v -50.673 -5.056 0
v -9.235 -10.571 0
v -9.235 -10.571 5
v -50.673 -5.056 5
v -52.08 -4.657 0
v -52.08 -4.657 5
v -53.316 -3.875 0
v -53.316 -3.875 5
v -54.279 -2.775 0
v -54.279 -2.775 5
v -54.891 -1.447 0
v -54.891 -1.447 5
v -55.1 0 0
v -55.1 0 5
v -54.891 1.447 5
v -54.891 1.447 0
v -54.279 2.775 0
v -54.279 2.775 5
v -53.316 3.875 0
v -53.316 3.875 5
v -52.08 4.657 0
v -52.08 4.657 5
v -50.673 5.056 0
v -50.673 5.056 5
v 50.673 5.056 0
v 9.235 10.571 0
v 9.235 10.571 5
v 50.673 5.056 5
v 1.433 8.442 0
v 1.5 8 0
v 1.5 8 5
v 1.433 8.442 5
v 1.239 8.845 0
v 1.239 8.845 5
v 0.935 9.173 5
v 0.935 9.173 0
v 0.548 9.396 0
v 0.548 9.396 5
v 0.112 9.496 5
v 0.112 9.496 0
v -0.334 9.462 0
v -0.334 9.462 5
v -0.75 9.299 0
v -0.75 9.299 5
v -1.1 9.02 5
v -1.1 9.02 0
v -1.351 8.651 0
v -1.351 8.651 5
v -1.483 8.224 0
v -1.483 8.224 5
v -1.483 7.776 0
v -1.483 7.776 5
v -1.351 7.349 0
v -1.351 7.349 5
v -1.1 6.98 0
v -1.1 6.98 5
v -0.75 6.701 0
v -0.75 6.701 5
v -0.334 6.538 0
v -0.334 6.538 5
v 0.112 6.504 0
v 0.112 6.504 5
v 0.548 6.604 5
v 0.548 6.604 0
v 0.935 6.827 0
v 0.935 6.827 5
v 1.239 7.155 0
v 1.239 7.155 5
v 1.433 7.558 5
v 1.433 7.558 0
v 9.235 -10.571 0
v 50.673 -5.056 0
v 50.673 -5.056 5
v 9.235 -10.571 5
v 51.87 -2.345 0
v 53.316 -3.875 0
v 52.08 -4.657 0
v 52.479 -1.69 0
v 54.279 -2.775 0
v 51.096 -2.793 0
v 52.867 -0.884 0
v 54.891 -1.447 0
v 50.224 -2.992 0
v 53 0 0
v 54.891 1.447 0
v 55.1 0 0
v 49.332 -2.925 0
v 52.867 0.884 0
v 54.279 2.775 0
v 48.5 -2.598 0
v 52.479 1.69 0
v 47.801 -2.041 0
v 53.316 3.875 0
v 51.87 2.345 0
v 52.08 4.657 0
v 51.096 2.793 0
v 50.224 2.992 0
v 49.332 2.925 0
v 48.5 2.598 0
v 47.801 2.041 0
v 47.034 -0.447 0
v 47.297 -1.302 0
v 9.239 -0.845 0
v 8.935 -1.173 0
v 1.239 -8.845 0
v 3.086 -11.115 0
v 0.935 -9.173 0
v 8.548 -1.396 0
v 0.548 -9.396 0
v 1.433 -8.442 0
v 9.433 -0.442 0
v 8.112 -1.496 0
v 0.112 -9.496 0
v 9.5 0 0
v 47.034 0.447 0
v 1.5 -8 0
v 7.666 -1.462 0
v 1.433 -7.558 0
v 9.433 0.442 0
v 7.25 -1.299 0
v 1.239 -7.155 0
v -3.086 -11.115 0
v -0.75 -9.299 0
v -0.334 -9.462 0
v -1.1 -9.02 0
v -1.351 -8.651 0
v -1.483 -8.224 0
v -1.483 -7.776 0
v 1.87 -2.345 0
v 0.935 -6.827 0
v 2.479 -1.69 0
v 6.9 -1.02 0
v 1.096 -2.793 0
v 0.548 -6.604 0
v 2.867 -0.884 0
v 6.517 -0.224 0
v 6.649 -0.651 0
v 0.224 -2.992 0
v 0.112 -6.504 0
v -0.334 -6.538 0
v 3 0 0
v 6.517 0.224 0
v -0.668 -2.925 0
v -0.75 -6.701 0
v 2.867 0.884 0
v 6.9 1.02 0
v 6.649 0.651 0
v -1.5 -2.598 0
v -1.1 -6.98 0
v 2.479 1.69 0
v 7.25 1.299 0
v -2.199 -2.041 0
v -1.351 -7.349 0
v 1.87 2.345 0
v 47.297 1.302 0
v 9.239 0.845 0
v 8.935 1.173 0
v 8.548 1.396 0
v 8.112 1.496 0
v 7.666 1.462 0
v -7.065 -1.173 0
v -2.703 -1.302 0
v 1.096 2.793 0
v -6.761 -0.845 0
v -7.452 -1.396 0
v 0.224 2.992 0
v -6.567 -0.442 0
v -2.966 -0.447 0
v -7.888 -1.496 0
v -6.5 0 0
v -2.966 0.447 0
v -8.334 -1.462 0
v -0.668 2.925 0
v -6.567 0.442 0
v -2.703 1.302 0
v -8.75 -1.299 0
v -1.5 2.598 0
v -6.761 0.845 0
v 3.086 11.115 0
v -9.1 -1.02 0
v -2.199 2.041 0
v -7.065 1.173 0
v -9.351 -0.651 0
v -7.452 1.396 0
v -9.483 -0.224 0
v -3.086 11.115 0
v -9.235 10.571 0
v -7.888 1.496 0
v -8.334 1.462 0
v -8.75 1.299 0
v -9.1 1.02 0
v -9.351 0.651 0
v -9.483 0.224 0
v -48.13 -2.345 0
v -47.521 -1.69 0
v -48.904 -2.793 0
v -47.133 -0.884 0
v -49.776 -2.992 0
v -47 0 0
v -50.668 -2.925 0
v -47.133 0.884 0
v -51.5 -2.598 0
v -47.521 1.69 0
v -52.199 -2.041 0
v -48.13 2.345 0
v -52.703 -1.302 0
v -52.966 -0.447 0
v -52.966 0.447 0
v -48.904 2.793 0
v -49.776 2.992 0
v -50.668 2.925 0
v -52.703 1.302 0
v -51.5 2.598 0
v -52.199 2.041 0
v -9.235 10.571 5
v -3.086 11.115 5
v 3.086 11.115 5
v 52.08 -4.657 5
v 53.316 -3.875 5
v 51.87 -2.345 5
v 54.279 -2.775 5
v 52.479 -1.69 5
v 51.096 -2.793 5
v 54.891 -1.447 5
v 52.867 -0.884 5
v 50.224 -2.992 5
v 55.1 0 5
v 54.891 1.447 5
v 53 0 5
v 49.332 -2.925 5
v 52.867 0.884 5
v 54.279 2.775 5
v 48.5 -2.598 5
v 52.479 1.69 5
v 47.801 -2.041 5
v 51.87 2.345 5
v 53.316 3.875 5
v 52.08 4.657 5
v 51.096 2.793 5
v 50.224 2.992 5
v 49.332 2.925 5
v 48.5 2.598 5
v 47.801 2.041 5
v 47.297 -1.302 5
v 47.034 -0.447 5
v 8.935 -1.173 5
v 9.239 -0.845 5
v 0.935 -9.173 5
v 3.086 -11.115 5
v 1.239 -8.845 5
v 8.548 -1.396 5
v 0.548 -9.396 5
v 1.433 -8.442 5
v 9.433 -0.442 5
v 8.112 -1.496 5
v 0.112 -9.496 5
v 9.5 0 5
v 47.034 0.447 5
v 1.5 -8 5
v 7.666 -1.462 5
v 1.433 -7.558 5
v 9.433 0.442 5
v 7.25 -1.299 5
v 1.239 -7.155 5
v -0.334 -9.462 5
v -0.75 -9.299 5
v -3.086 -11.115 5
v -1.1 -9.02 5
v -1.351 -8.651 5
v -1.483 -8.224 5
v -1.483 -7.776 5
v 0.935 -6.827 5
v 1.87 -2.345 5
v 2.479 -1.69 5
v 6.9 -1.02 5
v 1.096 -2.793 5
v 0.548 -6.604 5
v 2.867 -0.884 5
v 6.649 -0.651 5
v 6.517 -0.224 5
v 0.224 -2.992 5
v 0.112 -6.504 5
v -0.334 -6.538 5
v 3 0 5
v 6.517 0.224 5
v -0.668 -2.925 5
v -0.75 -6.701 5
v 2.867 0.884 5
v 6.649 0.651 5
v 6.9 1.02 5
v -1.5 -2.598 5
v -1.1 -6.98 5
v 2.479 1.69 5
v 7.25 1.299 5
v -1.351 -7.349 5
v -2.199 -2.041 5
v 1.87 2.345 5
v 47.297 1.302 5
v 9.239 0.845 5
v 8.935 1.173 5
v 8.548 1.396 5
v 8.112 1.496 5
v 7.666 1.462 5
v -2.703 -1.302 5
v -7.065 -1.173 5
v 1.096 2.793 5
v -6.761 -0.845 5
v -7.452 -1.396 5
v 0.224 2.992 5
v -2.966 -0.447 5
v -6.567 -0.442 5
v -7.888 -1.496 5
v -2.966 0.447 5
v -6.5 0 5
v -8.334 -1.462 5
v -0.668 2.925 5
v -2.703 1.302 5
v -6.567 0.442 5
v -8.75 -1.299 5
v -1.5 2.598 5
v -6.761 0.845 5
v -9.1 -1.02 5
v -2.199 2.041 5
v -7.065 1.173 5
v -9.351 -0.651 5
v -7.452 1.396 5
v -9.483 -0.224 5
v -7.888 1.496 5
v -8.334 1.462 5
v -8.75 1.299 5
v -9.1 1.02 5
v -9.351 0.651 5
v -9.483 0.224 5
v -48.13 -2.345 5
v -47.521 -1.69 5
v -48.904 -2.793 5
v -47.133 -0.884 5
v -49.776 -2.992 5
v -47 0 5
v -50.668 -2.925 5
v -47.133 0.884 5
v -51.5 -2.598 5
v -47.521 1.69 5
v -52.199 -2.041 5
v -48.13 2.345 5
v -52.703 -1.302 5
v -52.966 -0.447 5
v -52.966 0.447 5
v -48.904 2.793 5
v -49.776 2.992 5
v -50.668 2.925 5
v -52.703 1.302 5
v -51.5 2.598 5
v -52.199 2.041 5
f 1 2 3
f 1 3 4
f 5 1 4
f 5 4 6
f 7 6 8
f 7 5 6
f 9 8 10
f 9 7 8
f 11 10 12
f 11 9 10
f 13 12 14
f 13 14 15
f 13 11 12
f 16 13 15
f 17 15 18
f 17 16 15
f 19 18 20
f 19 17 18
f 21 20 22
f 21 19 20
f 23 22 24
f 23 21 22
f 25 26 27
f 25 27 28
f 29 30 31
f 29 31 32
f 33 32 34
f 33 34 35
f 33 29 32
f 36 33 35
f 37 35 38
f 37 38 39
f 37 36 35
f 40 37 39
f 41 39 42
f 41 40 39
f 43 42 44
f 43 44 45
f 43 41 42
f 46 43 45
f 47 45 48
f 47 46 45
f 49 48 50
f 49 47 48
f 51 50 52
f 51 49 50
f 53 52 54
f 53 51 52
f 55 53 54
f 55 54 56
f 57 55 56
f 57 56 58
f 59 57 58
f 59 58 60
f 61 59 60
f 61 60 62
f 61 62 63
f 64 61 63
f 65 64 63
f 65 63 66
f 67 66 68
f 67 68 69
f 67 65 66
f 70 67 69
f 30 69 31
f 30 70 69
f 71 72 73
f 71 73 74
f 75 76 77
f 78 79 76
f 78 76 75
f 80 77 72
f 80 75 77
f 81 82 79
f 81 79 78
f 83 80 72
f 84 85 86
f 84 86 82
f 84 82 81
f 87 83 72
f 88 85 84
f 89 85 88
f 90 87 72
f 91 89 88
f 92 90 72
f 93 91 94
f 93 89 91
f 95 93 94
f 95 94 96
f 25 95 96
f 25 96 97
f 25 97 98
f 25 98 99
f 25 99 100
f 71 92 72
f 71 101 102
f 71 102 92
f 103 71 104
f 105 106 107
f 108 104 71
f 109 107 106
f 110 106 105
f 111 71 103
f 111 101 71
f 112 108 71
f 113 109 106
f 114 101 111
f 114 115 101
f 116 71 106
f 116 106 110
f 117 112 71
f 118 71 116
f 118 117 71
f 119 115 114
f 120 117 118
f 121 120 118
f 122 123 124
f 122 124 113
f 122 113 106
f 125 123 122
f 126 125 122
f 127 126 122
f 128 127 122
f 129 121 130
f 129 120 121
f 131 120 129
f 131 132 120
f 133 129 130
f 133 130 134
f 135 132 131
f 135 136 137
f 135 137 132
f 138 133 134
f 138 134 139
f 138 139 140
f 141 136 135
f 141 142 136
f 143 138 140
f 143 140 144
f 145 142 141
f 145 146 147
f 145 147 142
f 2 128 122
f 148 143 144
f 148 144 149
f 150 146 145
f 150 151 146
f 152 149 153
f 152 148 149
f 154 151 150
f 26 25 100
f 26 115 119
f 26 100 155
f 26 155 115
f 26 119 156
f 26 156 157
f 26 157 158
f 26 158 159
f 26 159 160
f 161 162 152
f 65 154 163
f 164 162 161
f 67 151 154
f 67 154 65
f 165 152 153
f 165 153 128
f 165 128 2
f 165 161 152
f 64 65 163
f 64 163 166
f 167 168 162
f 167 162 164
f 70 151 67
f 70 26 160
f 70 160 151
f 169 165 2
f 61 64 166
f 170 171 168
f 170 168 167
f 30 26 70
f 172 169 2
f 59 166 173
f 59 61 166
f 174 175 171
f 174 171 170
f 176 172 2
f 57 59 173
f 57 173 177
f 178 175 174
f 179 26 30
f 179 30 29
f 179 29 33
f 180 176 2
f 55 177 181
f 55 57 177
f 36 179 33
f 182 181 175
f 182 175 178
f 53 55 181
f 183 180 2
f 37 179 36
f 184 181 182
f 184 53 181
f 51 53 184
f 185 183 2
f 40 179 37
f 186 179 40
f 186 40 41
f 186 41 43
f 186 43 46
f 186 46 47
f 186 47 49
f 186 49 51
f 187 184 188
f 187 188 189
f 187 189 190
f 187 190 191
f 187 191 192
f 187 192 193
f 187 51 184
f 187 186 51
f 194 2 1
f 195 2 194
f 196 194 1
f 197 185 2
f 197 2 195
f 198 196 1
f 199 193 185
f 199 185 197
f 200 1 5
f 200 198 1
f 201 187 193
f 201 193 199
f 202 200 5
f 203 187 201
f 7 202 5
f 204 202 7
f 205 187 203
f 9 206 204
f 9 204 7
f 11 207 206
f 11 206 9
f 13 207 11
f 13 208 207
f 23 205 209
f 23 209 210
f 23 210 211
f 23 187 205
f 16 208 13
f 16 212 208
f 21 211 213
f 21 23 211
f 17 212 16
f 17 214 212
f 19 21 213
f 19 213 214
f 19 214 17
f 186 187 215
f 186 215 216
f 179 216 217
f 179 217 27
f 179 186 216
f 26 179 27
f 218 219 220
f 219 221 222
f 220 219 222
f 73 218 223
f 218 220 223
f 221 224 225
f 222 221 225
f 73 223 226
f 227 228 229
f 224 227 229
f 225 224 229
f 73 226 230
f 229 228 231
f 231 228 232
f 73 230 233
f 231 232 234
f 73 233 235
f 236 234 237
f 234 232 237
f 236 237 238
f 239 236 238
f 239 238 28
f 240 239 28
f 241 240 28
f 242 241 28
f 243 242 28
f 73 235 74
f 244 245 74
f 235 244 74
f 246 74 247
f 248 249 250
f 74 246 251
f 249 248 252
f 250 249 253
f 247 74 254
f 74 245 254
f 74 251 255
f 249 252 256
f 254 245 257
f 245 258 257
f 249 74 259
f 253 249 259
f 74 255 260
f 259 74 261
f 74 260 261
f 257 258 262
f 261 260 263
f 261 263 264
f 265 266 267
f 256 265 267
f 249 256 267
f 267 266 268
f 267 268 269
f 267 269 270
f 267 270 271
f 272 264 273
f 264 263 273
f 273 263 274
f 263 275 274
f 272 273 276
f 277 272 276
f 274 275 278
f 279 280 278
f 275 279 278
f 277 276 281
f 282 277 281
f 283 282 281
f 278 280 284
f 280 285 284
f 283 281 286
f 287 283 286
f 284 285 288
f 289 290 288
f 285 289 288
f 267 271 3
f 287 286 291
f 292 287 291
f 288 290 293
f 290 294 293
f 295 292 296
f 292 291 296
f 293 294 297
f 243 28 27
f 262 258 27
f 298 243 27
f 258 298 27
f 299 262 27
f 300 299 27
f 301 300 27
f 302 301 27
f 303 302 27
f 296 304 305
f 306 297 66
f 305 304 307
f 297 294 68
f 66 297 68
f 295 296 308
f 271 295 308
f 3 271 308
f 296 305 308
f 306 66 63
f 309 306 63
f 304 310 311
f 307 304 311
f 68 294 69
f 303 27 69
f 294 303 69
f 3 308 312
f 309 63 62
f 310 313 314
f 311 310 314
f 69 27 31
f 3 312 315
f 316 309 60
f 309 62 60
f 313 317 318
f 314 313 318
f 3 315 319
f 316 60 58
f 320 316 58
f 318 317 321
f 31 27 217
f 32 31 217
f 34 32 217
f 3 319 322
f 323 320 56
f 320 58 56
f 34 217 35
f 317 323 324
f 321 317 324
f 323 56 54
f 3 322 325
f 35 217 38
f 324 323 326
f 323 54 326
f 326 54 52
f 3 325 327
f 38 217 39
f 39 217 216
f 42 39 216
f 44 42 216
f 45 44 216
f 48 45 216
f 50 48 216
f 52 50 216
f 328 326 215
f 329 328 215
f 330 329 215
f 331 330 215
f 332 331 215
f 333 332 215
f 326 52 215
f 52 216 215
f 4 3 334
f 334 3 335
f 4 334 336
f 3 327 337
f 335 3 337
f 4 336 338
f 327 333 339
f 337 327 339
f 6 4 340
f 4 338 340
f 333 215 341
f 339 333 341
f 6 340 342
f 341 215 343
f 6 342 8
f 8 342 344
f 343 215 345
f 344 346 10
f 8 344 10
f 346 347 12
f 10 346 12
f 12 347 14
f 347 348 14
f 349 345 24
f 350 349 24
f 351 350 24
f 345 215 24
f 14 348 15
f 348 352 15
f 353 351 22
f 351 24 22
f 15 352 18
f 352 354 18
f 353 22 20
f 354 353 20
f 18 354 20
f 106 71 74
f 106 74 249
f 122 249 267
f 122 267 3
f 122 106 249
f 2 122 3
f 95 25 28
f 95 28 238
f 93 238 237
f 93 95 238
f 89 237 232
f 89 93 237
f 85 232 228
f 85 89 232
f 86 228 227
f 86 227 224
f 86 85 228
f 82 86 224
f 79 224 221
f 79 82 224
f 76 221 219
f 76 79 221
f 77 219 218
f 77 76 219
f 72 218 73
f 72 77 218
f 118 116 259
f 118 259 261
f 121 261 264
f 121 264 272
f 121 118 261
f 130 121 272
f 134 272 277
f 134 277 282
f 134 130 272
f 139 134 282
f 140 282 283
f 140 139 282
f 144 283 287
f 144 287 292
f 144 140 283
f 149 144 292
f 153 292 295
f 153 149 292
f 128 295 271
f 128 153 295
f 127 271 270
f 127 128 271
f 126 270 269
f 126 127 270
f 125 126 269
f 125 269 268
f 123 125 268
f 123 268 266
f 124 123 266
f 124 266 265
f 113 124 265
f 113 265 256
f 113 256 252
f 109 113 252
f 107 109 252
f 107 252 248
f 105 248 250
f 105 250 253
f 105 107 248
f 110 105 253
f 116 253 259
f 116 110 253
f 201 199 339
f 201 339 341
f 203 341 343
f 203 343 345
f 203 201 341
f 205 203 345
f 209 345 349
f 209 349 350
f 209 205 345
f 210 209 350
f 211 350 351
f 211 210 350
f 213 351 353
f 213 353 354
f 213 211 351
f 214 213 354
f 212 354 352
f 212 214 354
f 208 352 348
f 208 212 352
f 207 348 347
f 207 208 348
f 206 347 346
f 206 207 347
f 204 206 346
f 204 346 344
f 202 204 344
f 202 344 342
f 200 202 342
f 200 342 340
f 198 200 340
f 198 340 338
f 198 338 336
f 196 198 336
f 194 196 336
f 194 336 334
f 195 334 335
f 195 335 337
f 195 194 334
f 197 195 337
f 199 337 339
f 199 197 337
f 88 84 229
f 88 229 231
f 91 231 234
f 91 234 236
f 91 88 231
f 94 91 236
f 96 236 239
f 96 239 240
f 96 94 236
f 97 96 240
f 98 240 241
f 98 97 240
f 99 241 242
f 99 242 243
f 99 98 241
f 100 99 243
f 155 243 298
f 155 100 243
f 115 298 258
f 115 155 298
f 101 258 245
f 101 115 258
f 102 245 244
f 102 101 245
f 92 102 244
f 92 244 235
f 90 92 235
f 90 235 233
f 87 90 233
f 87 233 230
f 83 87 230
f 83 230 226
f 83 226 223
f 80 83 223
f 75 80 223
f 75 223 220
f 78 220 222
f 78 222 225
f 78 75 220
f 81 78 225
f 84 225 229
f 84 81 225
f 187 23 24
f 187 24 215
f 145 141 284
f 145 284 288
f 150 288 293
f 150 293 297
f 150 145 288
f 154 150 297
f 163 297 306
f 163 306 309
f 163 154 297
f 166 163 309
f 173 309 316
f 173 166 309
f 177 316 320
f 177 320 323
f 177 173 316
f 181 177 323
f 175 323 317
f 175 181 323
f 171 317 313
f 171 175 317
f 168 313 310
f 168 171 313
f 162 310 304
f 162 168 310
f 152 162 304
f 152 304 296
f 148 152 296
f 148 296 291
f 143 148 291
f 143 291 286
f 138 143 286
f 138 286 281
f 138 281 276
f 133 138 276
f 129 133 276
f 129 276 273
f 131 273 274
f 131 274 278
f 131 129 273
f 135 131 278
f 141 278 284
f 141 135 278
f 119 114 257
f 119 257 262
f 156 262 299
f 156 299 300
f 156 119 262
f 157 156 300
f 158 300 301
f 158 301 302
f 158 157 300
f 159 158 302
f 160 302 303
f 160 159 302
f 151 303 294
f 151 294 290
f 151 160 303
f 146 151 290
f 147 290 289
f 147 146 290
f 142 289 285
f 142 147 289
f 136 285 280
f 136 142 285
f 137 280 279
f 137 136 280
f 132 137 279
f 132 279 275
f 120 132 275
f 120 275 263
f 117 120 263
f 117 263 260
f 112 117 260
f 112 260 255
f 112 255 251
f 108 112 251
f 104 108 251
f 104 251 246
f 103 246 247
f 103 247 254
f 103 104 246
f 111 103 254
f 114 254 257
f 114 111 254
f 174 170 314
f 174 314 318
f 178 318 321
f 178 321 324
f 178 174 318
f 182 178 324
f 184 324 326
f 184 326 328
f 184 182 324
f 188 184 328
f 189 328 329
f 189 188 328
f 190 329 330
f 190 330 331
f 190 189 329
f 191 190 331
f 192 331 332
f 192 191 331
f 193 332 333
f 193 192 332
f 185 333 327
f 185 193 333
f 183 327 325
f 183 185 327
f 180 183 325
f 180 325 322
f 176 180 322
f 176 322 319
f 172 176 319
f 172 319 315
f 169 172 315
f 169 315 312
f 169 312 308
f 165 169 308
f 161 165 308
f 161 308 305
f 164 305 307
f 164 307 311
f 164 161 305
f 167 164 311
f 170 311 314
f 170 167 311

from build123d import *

# Parameters (mm, degrees)
SZKIC1_R                    = 3
SZKIC1_R_2                  = 1.5
DODANIE_WYCI_GNI_CIE1_DEPTH = 5


with BuildPart() as part:
    # Szkic1 → Dodanie-wyciągnięcie1 (new body)
    with BuildSketch(Plane.XY):
        with BuildLine():
            Line((-50.67287635, 5.055665151), (-9.235111676, 10.570763761))
            ThreePointArc((-9.235111676, 10.570763761), (0, 11.182632843), (9.235111676, 10.570763761))
            Line((9.235111676, 10.570763761), (50.67287635, 5.055665151))
            ThreePointArc((50.67287635, 5.055665151), (55.100246338, 0), (50.67287635, -5.055665151))
            Line((50.67287635, -5.055665151), (9.235111676, -10.570763761))
            ThreePointArc((9.235111676, -10.570763761), (0, -11.182632843), (-9.235111676, -10.570763761))
            Line((-9.235111676, -10.570763761), (-50.67287635, -5.055665151))
            ThreePointArc((-50.67287635, -5.055665151), (-55.100246338, 0), (-50.67287635, 5.055665151))
        make_face()
        Circle(SZKIC1_R, mode=Mode.SUBTRACT)
        with Locations((0, 8)):
            Circle(SZKIC1_R_2, mode=Mode.SUBTRACT)
        with Locations((-8, 0)):
            Circle(SZKIC1_R_2, mode=Mode.SUBTRACT)
        with Locations((8, 0)):
            Circle(SZKIC1_R_2, mode=Mode.SUBTRACT)
        with Locations((0, -8)):
            Circle(SZKIC1_R_2, mode=Mode.SUBTRACT)
        with Locations((-50, 0)):
            Circle(SZKIC1_R, mode=Mode.SUBTRACT)
        with Locations((50, 0)):
            Circle(SZKIC1_R, mode=Mode.SUBTRACT)
    extrude(amount=DODANIE_WYCI_GNI_CIE1_DEPTH)


solid = part.part
